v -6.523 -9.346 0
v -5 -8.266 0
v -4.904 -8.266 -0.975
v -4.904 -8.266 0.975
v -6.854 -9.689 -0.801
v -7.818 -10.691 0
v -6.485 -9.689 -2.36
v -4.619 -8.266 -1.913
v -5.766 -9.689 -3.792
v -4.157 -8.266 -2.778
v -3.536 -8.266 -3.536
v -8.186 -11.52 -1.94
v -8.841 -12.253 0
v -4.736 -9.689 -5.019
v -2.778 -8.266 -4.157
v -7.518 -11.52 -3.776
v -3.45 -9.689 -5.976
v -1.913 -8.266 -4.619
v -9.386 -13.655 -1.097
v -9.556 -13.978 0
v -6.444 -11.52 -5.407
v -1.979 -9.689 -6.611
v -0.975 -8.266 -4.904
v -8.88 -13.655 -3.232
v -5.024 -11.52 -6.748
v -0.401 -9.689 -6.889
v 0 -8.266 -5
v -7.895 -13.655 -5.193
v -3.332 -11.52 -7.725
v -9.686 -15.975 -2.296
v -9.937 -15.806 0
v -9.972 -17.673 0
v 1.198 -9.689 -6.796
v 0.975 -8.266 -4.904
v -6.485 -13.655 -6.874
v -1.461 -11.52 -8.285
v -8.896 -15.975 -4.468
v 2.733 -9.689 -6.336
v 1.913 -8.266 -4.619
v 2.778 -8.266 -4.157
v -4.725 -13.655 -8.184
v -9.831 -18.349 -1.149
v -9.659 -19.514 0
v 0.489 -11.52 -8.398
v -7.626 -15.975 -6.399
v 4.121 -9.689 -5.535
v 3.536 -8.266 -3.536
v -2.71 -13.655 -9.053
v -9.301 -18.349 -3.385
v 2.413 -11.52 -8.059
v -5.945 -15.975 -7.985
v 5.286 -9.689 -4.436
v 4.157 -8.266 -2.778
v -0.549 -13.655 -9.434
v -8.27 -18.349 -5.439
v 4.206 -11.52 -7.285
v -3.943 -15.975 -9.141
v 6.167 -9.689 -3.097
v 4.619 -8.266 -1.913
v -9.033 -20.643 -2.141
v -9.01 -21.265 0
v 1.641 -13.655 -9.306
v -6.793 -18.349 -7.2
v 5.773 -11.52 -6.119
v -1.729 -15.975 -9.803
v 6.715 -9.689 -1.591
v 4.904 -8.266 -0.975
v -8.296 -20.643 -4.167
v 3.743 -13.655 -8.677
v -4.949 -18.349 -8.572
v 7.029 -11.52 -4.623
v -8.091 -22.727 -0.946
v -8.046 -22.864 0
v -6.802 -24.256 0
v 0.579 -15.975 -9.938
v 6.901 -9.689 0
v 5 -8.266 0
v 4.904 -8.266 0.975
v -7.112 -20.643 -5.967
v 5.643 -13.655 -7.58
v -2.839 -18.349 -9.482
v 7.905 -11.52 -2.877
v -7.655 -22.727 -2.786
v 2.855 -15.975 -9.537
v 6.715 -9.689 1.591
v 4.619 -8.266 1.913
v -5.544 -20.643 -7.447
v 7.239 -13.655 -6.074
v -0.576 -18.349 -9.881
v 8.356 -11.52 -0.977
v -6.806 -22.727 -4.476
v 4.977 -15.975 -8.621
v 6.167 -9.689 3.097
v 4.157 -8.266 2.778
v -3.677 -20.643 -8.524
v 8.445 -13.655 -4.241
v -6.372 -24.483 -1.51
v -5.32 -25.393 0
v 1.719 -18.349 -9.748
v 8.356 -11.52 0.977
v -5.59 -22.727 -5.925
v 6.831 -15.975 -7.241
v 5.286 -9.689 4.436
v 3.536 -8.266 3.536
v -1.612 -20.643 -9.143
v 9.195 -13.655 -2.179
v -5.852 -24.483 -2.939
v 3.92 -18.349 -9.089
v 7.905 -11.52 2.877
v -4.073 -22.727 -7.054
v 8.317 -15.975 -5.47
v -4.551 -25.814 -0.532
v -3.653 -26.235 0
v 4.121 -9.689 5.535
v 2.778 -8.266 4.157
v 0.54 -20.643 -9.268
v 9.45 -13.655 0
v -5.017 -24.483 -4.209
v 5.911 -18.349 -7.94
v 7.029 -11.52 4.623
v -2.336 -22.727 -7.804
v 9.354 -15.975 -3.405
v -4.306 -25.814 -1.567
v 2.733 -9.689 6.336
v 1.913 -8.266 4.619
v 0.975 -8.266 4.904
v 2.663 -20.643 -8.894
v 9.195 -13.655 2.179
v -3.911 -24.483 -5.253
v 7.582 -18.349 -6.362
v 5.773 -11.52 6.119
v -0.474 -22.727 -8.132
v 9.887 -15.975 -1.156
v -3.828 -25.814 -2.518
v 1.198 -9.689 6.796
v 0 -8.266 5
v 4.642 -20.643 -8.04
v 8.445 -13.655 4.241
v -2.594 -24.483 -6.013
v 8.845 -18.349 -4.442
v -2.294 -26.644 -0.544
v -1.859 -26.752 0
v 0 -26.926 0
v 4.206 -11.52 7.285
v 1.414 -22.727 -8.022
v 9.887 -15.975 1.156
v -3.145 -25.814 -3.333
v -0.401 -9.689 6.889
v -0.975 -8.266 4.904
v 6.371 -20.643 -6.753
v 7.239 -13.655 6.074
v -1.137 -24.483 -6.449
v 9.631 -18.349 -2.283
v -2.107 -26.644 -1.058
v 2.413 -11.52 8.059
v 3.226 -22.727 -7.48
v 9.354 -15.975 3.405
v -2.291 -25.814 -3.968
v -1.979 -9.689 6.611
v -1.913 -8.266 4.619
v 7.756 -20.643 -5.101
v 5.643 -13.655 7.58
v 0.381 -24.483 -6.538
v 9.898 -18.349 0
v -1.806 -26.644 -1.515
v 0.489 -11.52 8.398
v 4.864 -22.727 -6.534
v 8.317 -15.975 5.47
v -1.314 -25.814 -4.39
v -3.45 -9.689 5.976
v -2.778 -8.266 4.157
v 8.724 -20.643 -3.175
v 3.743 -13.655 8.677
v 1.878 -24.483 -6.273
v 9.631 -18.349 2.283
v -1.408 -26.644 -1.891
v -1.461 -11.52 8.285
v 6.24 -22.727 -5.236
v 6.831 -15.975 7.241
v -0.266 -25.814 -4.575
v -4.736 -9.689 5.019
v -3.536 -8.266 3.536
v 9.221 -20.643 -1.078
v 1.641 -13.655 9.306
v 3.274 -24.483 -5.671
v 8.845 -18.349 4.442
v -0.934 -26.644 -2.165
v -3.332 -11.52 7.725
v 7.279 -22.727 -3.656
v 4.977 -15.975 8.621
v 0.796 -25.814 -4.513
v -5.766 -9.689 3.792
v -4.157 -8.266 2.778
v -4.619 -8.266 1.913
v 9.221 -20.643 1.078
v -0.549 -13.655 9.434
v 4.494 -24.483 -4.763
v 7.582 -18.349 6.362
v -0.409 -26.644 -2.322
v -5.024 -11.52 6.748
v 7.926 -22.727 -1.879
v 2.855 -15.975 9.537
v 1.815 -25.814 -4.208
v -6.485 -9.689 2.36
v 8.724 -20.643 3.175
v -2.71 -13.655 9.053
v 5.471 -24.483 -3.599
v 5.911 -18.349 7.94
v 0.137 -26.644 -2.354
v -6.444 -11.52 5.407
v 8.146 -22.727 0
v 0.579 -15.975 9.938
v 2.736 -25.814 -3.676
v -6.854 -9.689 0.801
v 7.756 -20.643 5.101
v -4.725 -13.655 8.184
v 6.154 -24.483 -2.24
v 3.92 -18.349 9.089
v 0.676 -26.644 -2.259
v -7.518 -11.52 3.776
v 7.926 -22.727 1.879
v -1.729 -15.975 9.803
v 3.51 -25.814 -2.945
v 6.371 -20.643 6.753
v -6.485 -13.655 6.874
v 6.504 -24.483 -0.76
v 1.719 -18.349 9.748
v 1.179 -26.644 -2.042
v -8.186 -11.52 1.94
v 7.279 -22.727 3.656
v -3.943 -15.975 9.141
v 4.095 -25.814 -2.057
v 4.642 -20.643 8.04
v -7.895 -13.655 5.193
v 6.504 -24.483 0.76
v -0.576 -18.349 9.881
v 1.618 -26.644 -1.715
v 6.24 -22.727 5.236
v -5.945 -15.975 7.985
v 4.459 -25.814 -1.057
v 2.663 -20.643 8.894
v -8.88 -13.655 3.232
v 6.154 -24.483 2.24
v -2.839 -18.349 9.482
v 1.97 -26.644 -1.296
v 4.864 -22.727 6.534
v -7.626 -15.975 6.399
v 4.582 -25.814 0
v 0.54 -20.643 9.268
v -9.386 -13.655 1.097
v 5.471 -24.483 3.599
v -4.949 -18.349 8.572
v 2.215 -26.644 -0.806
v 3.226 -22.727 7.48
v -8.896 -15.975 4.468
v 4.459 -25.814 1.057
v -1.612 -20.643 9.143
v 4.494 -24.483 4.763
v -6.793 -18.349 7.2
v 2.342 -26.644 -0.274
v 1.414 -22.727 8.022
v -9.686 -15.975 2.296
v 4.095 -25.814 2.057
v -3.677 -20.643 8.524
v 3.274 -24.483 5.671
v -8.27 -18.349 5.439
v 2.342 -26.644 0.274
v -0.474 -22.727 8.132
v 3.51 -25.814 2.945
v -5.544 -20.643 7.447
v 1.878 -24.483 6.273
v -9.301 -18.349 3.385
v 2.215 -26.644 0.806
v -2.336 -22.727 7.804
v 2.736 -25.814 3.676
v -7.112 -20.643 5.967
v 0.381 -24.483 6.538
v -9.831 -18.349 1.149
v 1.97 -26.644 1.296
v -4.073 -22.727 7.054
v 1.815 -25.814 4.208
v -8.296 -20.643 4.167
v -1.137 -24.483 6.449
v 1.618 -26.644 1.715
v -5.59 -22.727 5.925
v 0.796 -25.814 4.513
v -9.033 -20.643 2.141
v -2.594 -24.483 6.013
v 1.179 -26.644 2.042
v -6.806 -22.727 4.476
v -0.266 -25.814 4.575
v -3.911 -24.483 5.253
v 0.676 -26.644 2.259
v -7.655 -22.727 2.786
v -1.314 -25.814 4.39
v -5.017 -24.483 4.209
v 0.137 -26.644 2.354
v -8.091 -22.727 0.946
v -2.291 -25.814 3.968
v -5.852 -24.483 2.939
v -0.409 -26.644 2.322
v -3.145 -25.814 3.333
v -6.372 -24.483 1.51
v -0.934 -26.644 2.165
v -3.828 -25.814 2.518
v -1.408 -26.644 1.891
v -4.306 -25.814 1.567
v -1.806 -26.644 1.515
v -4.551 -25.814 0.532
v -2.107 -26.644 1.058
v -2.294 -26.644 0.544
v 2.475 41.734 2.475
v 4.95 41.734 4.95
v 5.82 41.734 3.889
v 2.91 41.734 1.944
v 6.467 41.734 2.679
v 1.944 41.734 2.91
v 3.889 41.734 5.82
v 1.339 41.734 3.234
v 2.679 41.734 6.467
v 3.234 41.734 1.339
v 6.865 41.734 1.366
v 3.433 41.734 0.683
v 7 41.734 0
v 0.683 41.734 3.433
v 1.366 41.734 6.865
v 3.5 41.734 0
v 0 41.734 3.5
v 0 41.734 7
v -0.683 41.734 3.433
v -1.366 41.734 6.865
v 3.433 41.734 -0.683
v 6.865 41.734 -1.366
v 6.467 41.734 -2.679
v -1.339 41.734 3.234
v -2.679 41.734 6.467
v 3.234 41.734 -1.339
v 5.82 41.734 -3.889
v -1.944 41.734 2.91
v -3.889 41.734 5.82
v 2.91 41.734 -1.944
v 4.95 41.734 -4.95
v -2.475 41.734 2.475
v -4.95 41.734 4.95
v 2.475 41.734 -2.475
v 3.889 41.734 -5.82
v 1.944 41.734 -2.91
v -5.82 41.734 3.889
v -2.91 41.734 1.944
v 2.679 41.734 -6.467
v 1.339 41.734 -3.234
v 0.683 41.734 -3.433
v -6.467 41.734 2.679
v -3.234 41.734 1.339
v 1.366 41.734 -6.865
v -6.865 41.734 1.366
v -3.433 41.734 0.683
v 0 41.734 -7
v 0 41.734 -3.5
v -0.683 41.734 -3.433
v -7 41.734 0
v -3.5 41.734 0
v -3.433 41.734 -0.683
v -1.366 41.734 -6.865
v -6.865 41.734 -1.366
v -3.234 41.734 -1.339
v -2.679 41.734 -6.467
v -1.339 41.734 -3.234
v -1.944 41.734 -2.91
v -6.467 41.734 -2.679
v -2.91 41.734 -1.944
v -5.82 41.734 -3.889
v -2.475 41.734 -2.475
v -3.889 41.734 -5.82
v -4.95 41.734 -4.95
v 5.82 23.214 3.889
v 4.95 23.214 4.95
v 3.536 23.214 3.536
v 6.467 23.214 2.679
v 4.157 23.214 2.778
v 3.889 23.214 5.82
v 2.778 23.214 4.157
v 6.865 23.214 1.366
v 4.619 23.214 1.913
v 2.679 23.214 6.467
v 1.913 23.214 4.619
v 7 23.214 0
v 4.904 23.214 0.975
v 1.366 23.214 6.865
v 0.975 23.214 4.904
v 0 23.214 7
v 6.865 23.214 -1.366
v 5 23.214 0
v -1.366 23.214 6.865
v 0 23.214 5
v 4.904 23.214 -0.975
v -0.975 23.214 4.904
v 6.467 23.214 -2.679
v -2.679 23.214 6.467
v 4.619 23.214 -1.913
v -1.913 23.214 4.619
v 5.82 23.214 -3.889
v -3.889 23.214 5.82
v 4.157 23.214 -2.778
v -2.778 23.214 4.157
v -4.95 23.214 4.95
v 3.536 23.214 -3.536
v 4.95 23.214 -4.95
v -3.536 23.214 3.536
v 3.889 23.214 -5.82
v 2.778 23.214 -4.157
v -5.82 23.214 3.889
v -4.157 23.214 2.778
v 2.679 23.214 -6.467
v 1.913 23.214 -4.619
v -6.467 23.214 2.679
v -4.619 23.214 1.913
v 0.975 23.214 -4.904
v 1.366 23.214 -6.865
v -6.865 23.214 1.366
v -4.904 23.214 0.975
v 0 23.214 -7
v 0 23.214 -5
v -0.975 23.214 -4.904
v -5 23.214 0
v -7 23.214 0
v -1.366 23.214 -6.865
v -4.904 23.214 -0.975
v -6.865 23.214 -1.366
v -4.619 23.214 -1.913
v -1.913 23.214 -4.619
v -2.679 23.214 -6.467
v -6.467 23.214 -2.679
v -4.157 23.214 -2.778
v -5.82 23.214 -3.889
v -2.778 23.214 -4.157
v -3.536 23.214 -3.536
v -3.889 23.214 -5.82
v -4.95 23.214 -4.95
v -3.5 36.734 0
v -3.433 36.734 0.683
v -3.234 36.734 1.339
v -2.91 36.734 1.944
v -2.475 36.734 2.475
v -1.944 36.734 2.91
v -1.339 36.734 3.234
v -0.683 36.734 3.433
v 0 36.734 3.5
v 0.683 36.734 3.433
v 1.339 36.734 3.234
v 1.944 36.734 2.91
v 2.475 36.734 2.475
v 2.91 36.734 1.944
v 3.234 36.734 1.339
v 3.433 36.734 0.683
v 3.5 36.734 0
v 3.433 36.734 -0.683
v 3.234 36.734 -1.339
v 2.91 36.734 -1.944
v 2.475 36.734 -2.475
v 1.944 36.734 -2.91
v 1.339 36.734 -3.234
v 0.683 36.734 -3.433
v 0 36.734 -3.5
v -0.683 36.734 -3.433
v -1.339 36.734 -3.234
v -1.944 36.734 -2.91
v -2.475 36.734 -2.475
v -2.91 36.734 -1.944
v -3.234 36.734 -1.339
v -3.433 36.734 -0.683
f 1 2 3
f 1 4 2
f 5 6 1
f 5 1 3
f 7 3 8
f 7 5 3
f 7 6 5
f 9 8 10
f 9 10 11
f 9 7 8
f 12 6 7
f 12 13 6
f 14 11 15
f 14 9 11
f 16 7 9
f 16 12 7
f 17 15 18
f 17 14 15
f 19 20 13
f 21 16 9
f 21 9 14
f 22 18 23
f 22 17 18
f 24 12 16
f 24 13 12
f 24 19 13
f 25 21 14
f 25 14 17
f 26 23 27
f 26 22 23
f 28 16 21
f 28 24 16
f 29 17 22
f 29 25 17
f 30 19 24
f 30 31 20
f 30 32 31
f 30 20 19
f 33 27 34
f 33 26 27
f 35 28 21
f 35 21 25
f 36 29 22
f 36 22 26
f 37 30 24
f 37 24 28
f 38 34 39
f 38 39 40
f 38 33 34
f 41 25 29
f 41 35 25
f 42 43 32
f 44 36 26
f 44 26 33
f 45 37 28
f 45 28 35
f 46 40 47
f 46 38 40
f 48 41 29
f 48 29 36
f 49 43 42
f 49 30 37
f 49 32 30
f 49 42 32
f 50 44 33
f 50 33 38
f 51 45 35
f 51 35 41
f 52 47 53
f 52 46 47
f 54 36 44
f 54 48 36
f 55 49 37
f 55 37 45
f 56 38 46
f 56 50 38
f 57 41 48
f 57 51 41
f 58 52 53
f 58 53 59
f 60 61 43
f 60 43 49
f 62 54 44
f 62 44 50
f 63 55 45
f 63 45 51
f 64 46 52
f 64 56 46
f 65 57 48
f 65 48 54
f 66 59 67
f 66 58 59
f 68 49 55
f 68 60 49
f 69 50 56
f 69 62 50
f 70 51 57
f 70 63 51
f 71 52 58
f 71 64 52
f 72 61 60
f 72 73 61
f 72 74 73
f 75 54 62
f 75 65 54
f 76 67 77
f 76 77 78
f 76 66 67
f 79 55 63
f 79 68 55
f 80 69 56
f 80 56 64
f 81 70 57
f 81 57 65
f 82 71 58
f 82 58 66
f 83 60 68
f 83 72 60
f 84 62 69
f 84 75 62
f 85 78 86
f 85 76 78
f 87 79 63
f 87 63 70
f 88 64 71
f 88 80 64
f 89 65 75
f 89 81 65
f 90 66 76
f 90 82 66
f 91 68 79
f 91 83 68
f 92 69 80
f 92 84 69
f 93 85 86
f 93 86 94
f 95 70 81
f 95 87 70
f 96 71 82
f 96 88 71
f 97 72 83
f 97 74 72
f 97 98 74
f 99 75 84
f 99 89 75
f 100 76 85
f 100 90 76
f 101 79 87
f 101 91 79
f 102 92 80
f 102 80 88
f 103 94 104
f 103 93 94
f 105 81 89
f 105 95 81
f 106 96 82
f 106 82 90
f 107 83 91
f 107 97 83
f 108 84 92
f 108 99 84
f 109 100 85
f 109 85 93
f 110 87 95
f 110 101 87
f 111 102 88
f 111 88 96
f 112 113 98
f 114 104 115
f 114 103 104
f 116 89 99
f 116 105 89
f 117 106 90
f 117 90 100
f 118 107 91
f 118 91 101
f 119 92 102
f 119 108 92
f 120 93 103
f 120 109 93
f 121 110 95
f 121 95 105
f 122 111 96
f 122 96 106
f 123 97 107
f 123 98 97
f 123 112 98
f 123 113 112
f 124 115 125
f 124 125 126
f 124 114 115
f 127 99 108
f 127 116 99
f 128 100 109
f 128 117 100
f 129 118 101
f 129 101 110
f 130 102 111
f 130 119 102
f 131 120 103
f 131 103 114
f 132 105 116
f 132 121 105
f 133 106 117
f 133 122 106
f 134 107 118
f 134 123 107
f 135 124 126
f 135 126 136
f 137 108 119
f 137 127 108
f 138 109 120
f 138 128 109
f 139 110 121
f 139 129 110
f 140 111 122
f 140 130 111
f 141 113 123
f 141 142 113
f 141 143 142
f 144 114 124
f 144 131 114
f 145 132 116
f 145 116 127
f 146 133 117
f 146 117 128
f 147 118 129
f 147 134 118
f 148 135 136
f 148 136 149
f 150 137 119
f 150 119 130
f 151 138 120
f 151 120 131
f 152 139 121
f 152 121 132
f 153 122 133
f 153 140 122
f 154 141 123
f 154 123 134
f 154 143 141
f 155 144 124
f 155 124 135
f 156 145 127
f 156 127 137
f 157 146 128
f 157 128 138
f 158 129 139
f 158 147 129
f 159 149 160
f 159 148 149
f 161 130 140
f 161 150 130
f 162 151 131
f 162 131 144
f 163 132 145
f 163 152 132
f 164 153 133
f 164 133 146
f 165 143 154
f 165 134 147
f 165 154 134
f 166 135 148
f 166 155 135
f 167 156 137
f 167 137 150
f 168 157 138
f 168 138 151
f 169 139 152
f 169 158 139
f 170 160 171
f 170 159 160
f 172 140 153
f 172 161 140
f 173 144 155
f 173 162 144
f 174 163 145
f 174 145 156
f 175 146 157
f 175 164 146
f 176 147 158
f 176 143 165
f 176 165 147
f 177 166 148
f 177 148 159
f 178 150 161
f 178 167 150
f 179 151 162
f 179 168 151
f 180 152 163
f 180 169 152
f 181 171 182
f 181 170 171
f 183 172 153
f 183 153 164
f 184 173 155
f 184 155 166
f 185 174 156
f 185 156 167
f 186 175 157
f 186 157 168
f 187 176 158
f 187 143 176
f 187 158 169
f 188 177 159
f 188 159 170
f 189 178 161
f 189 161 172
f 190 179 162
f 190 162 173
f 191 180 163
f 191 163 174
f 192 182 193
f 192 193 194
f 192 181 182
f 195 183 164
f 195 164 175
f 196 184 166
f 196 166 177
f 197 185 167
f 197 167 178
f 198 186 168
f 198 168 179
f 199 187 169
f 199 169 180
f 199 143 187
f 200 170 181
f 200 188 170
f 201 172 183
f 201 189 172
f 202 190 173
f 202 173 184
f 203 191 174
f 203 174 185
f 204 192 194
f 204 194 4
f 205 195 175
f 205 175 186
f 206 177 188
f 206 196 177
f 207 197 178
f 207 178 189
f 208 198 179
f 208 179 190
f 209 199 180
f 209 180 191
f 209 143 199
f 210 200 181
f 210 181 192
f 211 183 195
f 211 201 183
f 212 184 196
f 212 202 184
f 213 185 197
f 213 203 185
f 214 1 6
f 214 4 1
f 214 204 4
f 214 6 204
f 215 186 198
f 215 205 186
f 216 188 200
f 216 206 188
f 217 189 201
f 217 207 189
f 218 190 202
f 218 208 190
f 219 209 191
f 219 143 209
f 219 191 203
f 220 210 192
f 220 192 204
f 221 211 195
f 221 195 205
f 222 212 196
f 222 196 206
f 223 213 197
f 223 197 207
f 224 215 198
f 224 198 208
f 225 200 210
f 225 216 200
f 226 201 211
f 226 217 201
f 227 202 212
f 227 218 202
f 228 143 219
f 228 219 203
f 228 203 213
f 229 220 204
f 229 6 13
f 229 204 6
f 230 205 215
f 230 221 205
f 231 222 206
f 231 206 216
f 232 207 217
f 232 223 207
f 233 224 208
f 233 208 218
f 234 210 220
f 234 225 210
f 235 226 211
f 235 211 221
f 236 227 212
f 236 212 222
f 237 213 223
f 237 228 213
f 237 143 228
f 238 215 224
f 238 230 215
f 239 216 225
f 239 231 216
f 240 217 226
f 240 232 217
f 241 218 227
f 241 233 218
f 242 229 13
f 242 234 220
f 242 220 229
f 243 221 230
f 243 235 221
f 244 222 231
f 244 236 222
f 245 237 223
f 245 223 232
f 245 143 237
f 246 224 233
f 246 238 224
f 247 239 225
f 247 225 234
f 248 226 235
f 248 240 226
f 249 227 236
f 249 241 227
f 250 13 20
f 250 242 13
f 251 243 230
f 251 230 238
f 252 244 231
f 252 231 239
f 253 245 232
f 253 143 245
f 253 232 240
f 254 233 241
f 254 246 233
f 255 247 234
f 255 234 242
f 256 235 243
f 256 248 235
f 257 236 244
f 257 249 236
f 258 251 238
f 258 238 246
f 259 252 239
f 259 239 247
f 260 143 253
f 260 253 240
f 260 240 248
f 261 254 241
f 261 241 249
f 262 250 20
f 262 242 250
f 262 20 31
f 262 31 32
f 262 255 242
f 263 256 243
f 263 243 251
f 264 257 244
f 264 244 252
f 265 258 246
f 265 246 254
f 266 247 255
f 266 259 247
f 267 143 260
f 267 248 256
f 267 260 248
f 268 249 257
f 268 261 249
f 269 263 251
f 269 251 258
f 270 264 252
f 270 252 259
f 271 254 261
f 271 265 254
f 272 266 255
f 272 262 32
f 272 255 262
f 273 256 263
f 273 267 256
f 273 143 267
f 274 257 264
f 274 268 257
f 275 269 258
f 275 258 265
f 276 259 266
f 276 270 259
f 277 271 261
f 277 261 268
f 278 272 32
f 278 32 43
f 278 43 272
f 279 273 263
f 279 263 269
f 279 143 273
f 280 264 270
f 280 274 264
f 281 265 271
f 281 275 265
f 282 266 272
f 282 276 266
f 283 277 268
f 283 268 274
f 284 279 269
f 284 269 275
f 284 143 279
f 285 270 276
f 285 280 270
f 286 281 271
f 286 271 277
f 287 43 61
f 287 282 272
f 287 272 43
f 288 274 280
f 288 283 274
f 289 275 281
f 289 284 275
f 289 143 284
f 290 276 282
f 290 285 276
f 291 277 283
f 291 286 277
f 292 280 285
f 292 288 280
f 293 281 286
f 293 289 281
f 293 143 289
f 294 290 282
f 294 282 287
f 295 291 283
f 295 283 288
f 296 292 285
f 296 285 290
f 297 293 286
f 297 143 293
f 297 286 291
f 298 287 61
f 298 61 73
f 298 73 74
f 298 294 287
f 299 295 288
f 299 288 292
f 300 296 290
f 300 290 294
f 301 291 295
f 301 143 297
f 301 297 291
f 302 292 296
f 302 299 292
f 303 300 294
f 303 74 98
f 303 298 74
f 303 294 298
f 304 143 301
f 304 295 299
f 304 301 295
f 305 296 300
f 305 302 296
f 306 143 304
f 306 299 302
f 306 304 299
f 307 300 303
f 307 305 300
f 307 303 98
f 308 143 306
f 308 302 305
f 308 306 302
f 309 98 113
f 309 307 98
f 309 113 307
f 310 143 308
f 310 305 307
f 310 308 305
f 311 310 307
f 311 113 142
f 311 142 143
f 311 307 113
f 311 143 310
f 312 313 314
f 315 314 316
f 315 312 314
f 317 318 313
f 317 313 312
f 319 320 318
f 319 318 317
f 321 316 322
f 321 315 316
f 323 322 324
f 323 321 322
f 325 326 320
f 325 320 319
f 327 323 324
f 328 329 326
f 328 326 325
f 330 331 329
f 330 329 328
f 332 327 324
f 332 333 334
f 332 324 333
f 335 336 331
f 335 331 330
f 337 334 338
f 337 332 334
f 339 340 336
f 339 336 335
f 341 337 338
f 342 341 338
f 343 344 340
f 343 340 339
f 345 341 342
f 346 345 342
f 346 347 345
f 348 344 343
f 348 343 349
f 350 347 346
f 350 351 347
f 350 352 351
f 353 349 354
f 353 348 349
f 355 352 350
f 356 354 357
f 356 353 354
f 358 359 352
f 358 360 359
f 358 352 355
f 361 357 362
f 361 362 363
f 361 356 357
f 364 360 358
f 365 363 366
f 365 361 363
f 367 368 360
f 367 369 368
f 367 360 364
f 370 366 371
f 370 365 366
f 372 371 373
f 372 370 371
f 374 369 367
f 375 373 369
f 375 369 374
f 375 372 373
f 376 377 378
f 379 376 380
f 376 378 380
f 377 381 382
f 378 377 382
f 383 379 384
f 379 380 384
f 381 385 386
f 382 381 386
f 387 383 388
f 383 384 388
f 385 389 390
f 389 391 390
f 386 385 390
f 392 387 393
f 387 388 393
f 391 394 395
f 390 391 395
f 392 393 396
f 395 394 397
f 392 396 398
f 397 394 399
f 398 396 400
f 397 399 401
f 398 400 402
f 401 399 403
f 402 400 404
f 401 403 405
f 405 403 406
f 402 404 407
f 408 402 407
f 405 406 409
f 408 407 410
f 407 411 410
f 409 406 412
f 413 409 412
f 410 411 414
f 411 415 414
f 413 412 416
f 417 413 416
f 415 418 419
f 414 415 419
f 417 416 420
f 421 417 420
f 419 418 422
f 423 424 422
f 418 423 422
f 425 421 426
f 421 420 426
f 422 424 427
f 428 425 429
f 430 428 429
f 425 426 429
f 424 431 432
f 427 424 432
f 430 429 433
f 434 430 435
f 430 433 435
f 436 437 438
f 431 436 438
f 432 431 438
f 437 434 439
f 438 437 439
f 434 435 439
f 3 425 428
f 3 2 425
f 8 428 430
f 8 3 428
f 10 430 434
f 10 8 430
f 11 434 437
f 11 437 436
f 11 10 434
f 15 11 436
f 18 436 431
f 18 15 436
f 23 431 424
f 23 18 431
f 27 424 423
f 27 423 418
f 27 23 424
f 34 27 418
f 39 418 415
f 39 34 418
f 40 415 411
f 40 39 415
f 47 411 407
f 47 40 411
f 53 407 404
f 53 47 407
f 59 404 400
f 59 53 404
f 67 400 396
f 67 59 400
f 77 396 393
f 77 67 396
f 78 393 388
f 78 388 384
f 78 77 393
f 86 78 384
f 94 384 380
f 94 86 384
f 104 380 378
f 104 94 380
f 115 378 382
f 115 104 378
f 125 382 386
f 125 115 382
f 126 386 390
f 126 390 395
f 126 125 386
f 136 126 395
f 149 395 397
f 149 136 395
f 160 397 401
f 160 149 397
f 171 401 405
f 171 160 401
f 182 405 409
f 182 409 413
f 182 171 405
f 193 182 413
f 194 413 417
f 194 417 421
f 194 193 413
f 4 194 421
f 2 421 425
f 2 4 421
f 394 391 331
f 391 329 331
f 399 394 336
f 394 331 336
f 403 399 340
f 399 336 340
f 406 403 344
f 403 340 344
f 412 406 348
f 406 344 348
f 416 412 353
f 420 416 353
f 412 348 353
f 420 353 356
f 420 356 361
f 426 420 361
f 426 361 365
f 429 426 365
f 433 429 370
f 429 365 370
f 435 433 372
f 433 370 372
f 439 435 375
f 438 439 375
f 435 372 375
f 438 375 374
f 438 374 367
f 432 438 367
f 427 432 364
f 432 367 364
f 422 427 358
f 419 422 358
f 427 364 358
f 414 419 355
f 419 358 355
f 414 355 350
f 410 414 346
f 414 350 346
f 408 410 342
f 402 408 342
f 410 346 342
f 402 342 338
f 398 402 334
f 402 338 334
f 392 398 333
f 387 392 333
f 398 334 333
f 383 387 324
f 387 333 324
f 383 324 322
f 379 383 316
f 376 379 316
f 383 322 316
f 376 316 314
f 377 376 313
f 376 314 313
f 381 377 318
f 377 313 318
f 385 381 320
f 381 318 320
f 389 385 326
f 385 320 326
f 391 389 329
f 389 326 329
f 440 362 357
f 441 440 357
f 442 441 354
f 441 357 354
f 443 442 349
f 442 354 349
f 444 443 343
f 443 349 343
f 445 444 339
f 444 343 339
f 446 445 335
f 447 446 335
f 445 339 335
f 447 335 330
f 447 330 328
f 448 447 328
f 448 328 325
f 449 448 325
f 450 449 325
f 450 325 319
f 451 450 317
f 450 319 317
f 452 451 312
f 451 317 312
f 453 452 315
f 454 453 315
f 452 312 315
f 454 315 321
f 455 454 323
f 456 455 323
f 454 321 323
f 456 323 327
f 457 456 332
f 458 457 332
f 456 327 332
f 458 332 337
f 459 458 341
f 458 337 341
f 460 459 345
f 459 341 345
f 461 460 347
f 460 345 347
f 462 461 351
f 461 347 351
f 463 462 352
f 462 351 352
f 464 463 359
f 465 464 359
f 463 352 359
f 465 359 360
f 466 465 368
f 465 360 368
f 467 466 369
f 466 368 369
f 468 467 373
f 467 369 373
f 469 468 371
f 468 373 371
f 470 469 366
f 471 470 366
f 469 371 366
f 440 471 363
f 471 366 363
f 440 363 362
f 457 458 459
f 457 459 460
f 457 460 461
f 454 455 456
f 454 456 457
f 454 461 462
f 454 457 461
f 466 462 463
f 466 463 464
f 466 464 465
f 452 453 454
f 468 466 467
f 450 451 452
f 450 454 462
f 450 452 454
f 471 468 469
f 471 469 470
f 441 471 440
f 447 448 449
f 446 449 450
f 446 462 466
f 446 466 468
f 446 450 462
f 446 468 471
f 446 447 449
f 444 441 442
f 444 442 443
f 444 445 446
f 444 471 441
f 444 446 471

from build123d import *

# Parameters (mm, degrees)
SKETCH3_W          = 7
SKETCH3_H          = 18.520312213
SKETCH4_R          = 3.5
CUT_EXTRUDE1_DEPTH = 5


with BuildPart() as part:
    # Sketch1 → Revolve1 (revolve)
    with BuildSketch(Plane.XY, mode=Mode.PRIVATE) as revolve1_sk:
        with BuildLine():
            Line((0, 41.73429327), (5, 41.73429327))
            Line((5, 41.73429327), (5, -8.26570673))
            ThreePointArc((5, -8.26570673), (9.659258263, -19.514151219), (0, -26.925960768))
            Line((0, -26.925960768), (0, 41.73429327))
        make_face()
    revolve(revolve1_sk.sketch.rotate(Axis((0, 41.73429327, 0), (0, -1, 0)), 180), axis=Axis((0, 41.73429327, 0), (0, -1, 0)))

    # Sketch3 → Revolve3 (revolve)
    with BuildSketch(Plane.XY, mode=Mode.PRIVATE) as revolve3_sk:
        with Locations((3.5, 32.474137164)):
            Rectangle(SKETCH3_W, SKETCH3_H)
    revolve(revolve3_sk.sketch.rotate(Axis((0, 41.73429327, 0), (0, -1, 0)), 90), axis=Axis((0, 41.73429327, 0), (0, -1, 0)))

    # Sketch4 → Cut-Extrude1 (cut)
    with BuildSketch(Plane(origin=(0, 41.73429327, 0), x_dir=(1, 0, 0), z_dir=(0, 1, 0))):
        with Locations(Location((0, 0, 0), (0, 0, 180))):
            Circle(SKETCH4_R)
    extrude(amount=-CUT_EXTRUDE1_DEPTH, mode=Mode.SUBTRACT)


solid = part.part
